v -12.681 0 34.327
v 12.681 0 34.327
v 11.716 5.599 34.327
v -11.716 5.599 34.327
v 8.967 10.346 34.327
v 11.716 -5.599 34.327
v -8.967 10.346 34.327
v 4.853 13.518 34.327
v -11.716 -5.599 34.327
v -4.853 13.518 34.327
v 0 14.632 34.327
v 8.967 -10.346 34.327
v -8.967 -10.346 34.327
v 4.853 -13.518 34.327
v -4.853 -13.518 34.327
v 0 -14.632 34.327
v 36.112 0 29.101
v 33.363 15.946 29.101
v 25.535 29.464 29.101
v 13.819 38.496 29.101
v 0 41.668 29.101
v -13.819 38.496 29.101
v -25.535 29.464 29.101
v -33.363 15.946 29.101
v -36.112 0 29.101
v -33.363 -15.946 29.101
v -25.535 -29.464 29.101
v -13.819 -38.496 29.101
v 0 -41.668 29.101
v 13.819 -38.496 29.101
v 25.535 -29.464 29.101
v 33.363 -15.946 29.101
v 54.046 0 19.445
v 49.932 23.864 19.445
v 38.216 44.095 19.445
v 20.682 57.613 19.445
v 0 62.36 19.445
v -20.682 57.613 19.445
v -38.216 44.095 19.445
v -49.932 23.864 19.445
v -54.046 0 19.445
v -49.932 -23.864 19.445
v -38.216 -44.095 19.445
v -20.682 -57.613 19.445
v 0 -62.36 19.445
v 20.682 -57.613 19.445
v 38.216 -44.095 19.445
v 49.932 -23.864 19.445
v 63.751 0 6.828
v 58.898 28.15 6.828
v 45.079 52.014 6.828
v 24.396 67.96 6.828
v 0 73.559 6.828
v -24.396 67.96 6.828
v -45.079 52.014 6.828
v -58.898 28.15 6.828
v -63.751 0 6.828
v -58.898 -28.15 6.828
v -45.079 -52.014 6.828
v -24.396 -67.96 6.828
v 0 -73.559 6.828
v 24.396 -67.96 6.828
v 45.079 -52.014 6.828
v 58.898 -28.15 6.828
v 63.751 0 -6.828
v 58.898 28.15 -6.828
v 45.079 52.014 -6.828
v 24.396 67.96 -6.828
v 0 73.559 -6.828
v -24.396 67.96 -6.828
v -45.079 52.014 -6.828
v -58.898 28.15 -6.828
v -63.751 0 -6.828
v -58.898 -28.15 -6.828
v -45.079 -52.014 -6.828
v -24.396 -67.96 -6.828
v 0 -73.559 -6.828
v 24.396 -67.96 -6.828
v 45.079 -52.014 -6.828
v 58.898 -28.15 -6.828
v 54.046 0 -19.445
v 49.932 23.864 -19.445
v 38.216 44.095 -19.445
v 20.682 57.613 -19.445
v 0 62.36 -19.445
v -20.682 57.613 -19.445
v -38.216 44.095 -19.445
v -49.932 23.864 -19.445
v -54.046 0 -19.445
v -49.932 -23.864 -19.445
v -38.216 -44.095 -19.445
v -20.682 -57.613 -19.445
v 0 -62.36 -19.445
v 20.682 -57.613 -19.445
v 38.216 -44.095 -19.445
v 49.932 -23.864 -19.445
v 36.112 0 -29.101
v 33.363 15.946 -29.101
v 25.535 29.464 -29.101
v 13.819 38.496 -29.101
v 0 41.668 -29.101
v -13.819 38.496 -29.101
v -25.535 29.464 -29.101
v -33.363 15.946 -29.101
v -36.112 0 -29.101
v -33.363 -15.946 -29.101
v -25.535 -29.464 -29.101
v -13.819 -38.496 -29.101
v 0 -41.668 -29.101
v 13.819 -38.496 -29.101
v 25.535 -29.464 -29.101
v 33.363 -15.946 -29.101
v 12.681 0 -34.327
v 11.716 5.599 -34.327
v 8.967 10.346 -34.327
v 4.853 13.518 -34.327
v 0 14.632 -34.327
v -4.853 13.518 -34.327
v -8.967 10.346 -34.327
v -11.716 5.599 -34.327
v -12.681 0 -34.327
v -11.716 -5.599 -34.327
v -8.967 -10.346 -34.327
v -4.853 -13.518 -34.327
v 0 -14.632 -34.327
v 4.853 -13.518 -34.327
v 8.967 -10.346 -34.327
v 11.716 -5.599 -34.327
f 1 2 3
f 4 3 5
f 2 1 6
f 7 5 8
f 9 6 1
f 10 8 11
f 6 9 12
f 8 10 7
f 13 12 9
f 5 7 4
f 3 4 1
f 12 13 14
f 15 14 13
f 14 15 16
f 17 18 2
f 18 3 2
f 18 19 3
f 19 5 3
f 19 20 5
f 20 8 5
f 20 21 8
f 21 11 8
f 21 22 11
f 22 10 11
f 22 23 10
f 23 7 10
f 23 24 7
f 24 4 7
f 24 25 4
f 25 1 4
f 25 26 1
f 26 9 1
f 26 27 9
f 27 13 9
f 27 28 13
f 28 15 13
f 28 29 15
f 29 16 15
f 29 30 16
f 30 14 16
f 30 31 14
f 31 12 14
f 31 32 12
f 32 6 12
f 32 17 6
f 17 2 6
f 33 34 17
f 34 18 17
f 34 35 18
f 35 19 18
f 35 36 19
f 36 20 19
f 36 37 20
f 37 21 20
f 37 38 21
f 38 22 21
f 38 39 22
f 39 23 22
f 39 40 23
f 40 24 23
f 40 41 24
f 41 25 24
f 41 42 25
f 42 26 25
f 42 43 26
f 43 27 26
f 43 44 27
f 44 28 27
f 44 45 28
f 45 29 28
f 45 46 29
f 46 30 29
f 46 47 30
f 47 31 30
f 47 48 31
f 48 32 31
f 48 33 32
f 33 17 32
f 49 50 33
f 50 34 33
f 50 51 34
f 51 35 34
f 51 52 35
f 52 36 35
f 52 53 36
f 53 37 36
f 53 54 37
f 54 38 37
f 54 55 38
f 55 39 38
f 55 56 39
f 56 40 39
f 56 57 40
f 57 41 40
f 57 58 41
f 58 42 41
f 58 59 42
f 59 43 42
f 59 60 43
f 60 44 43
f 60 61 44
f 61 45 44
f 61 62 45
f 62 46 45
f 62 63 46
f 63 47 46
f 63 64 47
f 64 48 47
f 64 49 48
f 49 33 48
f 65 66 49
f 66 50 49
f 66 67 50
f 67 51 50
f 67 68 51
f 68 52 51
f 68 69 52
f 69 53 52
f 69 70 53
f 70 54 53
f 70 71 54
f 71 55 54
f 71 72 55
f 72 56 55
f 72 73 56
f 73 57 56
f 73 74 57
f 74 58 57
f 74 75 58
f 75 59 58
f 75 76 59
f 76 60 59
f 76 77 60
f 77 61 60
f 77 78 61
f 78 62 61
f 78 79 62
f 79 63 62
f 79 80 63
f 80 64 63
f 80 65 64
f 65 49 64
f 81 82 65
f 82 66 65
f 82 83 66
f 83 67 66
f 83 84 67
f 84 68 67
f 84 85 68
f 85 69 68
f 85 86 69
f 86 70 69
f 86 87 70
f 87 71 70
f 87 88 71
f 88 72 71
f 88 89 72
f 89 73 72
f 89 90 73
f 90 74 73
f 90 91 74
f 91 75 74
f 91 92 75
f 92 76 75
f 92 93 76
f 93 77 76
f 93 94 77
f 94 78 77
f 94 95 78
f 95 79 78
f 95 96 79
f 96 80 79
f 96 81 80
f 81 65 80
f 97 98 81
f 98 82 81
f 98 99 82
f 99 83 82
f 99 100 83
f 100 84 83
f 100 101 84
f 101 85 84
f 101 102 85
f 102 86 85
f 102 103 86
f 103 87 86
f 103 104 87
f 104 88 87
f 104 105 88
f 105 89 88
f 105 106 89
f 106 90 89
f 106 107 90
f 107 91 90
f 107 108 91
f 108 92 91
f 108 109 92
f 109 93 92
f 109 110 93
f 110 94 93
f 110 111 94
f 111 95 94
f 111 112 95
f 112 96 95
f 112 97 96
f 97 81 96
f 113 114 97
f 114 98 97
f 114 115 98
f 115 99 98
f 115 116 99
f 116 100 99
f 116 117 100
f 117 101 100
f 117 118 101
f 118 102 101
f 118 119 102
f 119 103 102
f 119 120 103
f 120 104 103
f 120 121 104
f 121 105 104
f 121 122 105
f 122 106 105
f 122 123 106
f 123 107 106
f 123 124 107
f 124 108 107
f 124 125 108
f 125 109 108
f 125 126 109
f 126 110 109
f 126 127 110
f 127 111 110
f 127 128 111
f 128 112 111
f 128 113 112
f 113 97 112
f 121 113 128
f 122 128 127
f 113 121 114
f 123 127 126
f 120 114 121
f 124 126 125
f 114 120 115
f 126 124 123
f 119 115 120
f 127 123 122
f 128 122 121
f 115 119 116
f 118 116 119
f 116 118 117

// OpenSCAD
// Generated by SolidPython 1.0.1 on 2020-07-29 00:46:51


scale(v = [13, 15, 7]) {
	sphere(r = 5);
}
/***********************************************
*********      SolidPython code:      **********
************************************************
 
# import packages: SolidPython
from solid import *
from solid.utils import *
from itertools import chain, combinations, permutations


class Resize:

    def __init__(self, scad_file):
        self.scad_file = scad_file
        #self.scad_file = import_scad(scad_file)
        # cone/cylinder param:
        self.r1 = 0
        self.r2 = 0
        self.h = 0
        # rectangular prism param:
        self.w = 0
        self.l = 0
        # ellipse param:
        self.r = 0

    # import OpenScad code (file name corresponds to shape)


    # classify shape + parameters
    def assign(self, param1, param2, param3):
        if self.scad_file == 'cone.scad':
            self.r1 = param1
            self.r2 = param2
            self.h = param3
        elif self.scad_file == 'cylinder.scad':
            self.r1 = param1
            self.r2 = param2
            self.h = param3
        elif self.scad_file == 'rectangularPrism.scad':
            self.h = param1
            self.l = param2
            self.w = param3
        else:
            self.r = param1
            self.h = param2

    # resize parameters
    def iterate(self):
        x = range(3, 20, 2)
        i = 1
        if self.scad_file == 'cone.scad':
            tempList = list(permutations(x, 2))
            for temp in tempList:
                param1 = temp[0]
                param2 = temp[1]
                filepath = 'produced_scad_files/' + 'cone' + str(param1) + '_' + str(param2) + '_' + '.scad'
                scad_render_to_file(cylinder(h=param1, r1=param2, r2=0), filepath)

        elif self.scad_file == 'cylinder.scad':
            tempList = list(permutations(x, 3))
            for temp in tempList:
                param1 = temp[0]
                param2 = temp[1]
                filepath = 'produced_scad_files/' + 'cylinder' + str(param1) + '_' + str(param2) + '_' + '.scad'
                scad_render_to_file(cylinder(h=param1, r1=param2, r2=param2), filepath)

        elif self.scad_file == 'rectangularPrism.scad':
            tempList = list(permutations(x, 3))
            for temp in tempList:
                param1 = temp[0]
                param2 = temp[1]
                param3 = temp[2]
                filepath = 'produced_scad_files/' + 'rectangularPrism' + str(param1) + '_' + str(param2) + '_' + str(
                    param3) + '.scad'
                scad_render_to_file(cube(size=(param1, param2, param3)), filepath)

        elif self.scad_file == 'ellipse.scad':
            tempList = list(permutations(x, 4))
            for temp in tempList:
                param1 = temp[0]
                param2 = temp[1]
                param3 = temp[2]
                param4 = temp[3]
                filepath = 'produced_scad_files/' + 'ellipse' + str(param1) + '_' + str(param2) + '_' + str(param3) + '_' + str(param4) + '.scad'
                scad_render_to_file(scale([param1, param2, param3])(sphere(r=param4)), filepath)

    def render_to_scadfile(self):
        scad_render_to_file(scad, 'example.scad') 
 
************************************************/
